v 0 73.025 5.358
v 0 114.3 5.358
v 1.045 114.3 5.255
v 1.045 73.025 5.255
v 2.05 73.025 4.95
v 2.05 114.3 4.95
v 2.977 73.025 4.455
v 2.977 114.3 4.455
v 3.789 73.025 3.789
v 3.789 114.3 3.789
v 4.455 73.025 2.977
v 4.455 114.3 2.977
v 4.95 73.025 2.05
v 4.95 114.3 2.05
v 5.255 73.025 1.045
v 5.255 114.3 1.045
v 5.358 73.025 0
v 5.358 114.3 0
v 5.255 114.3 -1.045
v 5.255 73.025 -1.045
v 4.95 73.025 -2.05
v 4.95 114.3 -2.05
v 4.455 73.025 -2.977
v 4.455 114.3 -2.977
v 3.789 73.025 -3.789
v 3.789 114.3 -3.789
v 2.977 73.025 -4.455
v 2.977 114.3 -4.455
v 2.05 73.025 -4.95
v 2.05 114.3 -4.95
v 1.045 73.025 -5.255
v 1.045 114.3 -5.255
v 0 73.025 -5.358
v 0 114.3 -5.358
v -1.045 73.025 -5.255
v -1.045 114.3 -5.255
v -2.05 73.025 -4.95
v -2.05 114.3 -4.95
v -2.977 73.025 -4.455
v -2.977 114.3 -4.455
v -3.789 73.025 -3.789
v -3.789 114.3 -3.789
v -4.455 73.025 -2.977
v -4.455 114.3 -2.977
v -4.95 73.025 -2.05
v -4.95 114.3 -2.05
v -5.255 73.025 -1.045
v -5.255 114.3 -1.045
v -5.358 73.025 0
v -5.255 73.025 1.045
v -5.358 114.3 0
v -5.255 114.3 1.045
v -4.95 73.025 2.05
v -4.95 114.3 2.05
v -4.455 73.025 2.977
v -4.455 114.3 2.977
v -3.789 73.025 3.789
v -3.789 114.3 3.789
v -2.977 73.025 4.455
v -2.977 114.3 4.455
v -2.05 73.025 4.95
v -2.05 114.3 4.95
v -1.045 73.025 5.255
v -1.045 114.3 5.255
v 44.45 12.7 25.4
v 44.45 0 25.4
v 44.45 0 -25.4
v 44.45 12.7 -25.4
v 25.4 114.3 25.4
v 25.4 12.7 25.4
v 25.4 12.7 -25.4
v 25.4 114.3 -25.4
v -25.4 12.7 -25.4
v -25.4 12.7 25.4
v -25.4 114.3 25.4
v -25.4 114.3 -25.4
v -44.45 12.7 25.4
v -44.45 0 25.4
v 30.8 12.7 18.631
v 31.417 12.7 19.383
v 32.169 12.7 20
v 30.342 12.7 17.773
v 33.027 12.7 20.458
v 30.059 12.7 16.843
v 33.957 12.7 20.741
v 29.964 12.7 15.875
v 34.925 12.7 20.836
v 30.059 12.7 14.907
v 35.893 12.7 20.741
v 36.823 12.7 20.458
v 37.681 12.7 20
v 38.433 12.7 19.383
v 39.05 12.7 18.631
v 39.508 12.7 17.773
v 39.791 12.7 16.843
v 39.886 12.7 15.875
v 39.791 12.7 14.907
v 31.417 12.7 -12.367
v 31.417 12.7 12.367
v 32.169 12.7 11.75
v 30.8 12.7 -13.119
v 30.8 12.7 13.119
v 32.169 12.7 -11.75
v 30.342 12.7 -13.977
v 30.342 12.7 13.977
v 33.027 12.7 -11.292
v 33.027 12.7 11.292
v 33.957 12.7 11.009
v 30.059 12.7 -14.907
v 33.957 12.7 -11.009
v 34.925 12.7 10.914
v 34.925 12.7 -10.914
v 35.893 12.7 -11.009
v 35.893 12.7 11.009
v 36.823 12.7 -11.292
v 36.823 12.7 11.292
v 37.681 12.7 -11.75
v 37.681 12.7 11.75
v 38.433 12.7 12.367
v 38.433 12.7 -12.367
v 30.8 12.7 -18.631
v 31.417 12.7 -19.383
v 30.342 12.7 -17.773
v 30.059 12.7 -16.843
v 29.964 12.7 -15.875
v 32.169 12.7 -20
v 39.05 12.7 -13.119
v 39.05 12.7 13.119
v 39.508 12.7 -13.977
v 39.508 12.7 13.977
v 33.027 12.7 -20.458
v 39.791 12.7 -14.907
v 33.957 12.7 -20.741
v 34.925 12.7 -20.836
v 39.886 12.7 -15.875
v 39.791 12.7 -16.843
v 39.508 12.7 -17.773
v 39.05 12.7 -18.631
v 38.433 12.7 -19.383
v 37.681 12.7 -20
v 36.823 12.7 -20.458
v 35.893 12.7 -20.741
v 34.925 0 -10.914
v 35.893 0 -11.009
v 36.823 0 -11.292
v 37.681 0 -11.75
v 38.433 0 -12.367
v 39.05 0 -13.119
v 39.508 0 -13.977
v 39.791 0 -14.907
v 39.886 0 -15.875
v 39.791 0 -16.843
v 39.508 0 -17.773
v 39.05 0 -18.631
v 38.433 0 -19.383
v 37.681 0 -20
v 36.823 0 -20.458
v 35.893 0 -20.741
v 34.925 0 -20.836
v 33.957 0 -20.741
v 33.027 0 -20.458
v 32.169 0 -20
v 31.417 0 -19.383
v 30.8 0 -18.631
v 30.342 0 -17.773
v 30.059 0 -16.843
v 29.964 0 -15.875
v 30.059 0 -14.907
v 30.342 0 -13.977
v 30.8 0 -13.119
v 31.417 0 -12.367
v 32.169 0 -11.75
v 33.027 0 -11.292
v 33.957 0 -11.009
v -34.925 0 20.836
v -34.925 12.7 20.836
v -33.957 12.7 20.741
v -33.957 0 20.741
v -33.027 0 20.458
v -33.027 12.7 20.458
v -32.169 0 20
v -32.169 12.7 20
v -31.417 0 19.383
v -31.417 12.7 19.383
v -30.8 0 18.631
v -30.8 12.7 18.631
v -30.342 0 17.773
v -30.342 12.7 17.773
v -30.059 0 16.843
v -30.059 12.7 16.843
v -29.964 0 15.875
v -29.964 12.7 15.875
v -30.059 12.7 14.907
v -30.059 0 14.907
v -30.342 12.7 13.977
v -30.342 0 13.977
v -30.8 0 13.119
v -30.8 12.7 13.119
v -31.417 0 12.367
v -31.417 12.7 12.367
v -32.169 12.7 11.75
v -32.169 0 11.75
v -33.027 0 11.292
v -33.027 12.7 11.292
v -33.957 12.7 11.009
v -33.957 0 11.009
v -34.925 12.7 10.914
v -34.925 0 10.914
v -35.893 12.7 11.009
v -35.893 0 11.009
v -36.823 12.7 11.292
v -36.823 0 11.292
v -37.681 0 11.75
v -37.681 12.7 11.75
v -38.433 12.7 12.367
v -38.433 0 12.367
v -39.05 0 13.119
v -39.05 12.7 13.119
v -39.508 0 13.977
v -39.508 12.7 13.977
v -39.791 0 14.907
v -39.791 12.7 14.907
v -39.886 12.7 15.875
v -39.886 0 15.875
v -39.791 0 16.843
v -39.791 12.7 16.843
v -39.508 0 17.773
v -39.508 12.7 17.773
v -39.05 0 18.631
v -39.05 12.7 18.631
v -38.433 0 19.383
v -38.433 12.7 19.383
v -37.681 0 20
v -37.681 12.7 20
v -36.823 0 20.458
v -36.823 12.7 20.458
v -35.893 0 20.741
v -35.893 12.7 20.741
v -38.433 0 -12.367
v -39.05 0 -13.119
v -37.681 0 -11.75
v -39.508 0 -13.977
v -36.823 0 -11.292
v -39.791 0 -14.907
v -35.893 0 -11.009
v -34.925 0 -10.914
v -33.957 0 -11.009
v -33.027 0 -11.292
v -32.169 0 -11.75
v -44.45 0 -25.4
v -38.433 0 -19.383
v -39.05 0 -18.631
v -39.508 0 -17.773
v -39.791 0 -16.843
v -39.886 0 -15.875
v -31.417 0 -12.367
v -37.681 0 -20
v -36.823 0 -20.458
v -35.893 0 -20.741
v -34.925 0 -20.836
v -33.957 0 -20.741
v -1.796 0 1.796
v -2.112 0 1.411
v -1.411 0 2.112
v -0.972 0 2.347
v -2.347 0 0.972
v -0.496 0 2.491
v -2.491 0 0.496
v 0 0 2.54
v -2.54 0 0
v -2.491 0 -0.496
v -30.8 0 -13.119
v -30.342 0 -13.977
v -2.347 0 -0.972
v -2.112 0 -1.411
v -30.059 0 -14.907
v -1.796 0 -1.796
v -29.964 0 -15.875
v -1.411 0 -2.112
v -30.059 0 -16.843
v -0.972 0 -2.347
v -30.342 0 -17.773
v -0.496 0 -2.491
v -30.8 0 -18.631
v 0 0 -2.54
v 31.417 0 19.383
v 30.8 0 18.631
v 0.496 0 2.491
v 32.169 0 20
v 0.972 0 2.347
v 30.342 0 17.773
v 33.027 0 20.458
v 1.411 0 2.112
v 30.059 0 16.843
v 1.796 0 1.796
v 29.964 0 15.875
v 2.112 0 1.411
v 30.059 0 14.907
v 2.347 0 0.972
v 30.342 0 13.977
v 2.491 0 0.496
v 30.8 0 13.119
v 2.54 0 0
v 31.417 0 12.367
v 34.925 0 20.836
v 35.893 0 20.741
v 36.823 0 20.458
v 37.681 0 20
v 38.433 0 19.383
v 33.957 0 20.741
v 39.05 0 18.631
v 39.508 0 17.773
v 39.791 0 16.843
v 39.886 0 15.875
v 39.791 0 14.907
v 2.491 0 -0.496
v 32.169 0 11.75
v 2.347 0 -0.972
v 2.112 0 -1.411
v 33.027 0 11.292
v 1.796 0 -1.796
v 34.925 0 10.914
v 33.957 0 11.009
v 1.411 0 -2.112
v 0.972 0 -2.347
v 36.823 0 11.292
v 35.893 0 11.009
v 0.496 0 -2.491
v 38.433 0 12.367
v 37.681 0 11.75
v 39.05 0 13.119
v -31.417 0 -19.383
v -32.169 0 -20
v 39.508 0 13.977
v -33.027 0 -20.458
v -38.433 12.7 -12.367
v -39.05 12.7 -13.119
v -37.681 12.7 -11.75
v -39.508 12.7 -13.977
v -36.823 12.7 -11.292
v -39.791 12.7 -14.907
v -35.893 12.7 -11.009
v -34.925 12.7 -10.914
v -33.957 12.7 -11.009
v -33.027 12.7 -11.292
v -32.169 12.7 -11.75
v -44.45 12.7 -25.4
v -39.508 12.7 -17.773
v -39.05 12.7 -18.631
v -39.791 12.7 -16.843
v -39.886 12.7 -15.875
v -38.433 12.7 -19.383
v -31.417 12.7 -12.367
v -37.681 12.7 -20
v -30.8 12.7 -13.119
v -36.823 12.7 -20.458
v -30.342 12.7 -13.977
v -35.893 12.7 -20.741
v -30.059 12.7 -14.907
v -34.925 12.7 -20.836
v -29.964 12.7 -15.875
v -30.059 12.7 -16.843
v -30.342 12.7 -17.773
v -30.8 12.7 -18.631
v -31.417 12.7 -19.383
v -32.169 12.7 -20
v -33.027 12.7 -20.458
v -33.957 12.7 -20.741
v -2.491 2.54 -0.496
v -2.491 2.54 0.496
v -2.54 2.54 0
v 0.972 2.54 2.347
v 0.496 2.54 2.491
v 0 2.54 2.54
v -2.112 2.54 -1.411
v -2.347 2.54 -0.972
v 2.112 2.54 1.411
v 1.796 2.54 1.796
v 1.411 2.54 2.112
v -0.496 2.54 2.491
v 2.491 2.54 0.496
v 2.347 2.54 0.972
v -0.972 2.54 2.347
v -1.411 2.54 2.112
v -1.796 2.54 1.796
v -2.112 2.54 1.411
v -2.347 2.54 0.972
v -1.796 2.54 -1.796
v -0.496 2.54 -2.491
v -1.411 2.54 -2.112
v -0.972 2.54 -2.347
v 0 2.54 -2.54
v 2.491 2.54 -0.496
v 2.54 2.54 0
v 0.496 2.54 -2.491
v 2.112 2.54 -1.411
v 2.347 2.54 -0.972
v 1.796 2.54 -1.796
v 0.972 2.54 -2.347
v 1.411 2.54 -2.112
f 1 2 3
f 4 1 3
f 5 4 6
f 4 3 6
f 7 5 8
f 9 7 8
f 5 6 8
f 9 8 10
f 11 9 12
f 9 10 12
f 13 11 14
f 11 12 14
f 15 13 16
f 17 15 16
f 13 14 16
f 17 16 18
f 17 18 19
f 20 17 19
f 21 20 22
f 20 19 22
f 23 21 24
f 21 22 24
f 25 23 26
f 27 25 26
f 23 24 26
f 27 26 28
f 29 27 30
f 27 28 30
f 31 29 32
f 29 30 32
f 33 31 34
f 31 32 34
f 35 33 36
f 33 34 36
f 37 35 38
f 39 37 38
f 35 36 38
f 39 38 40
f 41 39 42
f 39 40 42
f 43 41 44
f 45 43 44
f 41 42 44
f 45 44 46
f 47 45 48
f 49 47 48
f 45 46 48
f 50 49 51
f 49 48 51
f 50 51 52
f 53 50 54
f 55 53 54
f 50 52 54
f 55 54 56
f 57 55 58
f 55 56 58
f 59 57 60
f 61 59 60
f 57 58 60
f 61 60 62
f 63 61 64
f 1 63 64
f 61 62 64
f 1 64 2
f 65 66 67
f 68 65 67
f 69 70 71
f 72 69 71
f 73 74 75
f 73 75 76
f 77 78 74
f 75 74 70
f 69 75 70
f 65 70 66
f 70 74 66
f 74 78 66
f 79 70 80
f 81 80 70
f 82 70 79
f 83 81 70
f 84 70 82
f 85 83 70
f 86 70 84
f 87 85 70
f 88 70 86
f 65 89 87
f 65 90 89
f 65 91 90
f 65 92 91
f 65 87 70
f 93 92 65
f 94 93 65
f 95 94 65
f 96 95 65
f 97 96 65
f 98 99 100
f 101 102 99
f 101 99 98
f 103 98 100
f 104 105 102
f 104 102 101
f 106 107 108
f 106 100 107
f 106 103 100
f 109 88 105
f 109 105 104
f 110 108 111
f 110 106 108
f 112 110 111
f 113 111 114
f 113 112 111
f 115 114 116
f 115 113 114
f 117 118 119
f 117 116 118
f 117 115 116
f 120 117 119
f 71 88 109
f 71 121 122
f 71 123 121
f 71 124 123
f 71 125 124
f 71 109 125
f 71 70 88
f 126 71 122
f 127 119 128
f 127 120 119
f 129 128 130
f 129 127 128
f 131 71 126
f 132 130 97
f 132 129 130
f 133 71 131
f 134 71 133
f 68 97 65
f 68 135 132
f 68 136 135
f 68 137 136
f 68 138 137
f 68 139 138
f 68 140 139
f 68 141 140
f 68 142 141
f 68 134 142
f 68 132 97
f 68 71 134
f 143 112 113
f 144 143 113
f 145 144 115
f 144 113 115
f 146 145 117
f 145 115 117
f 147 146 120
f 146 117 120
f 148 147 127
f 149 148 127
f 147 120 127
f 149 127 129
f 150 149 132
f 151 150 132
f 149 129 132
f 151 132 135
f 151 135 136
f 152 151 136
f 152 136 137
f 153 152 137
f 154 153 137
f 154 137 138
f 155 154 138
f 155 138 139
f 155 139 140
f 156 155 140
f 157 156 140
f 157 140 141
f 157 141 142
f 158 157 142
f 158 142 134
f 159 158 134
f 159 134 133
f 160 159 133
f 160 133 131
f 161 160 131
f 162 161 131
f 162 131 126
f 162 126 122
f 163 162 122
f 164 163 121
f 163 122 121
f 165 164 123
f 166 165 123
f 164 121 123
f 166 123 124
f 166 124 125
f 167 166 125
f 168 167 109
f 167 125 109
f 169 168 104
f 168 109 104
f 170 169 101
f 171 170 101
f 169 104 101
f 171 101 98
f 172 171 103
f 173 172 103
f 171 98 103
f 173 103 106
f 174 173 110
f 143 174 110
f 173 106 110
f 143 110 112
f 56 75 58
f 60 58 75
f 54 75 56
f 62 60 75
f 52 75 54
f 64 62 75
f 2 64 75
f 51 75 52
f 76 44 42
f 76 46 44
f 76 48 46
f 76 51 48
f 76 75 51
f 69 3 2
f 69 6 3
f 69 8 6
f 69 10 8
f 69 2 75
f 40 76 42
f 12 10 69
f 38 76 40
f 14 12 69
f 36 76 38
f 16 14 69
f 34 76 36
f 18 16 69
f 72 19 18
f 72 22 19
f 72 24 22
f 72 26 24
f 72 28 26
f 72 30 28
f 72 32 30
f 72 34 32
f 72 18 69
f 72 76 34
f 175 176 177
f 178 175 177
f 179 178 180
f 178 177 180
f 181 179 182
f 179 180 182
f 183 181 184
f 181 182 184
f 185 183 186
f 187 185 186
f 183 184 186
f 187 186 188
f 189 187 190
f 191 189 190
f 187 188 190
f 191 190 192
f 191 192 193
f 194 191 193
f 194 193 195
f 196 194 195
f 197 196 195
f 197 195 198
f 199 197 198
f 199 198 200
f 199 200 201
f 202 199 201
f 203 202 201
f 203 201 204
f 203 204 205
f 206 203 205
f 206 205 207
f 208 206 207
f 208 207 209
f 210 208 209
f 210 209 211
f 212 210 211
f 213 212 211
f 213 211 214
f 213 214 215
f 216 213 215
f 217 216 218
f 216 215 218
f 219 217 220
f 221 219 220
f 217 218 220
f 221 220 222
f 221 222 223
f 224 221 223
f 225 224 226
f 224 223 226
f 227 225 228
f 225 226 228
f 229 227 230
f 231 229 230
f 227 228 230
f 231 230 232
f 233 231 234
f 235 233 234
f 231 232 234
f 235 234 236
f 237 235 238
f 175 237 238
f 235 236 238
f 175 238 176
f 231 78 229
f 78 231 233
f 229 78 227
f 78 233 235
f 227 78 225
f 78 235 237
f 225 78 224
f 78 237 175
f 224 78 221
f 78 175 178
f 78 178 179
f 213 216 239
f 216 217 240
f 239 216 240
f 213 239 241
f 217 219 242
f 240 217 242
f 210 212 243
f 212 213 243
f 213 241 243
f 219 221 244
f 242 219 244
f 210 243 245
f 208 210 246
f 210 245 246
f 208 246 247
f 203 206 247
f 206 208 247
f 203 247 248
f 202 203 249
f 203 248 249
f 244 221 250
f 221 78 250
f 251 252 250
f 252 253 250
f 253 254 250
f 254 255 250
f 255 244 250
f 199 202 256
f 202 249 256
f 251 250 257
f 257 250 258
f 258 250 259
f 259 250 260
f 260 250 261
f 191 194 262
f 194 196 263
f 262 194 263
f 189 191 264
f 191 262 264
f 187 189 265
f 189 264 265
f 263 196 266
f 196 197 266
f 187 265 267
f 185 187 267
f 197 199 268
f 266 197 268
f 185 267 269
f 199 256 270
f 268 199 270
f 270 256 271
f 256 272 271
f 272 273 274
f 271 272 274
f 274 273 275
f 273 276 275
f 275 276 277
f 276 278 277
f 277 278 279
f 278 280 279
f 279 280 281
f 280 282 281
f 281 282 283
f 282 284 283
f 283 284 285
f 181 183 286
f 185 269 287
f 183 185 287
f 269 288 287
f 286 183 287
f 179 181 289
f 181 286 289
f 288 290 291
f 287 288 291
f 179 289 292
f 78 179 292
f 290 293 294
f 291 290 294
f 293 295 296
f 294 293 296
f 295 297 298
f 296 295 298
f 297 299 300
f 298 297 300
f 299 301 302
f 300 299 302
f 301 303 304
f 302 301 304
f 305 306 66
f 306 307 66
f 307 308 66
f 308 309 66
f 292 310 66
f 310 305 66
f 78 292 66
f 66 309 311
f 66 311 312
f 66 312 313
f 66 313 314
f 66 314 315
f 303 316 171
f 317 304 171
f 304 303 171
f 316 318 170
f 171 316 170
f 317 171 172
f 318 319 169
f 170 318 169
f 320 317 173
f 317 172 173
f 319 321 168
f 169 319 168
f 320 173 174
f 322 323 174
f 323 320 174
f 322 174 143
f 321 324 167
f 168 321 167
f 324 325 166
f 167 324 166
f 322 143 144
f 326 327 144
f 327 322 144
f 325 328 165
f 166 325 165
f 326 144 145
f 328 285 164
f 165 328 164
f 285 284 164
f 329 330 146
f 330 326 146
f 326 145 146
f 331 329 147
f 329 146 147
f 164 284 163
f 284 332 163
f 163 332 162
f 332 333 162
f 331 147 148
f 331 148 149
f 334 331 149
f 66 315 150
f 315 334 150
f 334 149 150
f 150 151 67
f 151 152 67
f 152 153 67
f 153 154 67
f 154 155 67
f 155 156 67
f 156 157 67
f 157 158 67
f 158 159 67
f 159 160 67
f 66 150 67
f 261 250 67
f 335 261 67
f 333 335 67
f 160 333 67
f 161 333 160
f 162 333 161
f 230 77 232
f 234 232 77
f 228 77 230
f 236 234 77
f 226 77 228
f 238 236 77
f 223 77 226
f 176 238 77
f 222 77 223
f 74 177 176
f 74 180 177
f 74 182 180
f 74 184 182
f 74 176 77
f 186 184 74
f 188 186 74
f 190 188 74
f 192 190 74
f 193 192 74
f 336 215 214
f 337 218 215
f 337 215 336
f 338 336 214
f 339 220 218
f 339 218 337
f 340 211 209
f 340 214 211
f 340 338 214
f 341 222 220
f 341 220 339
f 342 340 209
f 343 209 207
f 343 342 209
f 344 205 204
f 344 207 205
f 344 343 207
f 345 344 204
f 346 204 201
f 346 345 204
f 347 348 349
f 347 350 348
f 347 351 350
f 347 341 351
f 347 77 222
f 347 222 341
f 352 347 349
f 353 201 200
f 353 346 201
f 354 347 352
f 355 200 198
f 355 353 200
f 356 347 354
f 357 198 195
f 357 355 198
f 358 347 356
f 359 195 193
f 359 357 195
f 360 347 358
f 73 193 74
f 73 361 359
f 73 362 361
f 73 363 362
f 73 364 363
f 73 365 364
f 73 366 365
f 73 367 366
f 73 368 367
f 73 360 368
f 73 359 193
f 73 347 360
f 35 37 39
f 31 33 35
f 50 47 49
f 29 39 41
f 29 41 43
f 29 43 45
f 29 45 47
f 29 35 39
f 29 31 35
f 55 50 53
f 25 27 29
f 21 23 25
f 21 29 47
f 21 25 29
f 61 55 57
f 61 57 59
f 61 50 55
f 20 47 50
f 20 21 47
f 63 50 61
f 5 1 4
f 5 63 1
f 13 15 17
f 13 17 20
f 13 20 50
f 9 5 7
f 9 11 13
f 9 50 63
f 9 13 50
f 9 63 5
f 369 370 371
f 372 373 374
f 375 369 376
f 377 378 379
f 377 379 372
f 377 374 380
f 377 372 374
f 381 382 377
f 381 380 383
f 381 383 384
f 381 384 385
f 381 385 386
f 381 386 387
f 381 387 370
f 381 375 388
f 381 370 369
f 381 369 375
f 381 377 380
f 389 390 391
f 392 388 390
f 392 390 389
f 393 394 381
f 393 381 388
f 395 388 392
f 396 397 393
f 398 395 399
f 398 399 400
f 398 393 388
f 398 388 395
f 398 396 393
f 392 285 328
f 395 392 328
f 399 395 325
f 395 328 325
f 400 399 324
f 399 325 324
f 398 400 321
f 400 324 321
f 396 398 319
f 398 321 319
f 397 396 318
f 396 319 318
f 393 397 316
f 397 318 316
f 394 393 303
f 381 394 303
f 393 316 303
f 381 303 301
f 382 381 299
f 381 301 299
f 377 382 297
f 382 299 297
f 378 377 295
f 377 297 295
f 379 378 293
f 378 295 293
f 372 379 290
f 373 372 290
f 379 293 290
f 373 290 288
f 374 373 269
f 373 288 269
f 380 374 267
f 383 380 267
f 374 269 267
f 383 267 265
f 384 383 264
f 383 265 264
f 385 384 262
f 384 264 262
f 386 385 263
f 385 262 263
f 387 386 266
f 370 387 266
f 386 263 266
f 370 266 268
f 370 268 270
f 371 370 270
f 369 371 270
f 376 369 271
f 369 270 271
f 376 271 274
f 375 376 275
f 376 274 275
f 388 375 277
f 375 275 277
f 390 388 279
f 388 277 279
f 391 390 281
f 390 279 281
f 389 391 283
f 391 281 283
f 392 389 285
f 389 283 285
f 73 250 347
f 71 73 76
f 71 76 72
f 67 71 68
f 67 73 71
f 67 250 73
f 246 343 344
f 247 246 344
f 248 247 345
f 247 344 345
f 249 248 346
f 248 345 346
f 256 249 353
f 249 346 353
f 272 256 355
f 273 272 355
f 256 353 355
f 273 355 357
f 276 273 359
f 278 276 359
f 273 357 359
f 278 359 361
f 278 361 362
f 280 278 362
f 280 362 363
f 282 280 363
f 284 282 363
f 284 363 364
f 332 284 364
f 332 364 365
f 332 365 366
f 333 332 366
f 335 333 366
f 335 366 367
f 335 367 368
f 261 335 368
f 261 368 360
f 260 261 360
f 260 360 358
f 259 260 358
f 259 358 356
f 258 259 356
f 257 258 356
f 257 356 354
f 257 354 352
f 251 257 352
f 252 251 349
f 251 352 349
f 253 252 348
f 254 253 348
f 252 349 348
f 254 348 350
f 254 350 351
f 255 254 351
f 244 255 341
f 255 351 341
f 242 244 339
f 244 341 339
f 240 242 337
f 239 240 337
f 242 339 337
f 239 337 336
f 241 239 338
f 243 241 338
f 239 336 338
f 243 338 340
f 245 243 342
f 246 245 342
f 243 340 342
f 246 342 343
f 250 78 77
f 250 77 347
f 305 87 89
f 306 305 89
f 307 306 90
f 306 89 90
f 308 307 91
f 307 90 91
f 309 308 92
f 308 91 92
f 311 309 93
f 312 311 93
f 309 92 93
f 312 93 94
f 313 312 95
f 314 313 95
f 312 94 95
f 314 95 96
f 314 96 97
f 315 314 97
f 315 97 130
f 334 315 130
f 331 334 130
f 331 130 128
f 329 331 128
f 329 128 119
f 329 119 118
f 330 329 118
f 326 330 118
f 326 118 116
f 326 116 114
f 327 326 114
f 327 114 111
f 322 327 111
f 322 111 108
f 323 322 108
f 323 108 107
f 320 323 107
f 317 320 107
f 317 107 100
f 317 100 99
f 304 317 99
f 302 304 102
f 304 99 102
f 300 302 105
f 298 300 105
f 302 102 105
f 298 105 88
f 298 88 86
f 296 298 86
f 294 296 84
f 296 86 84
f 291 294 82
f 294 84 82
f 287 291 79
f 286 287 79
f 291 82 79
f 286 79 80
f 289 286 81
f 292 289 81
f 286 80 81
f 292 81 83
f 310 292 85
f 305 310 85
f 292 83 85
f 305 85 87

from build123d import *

# Parameters (mm, degrees)
SKETCH1_W           = 88.9
SKETCH1_H           = 50.8
BOSS_EXTRUDE1_DEPTH = 114.3
SKETCH2_OUTSIDE_W   = 121.59
SKETCH2_OUTSIDE_H   = 83.49
SKETCH2_OUTSIDE_W_2 = 50.8
SKETCH2_OUTSIDE_H_2 = 50.8
CUT_EXTRUDE1_DEPTH  = 101.6
SKETCH3_R           = 4.9609375
CUT_EXTRUDE2_DEPTH  = 114.769602707
SKETCH4_R           = 5.3578125
CUT_EXTRUDE3_DEPTH  = 41.275
SKETCH5_R           = 2.54
CUT_EXTRUDE4_DEPTH  = 2.54


with BuildPart() as part:
    # Sketch1 → Boss-Extrude1 (new body)
    with BuildSketch(Plane(origin=(0, 0, 0), x_dir=(1, 0, 0), z_dir=(0, 1, 0))):
        Rectangle(SKETCH1_W, SKETCH1_H)
    extrude(amount=BOSS_EXTRUDE1_DEPTH)

    # Sketch2 outside → Cut-Extrude1 (cut)
    with BuildSketch(Plane(origin=(0, 114.3, 0), x_dir=(1, 0, 0), z_dir=(0, 1, 0))):
        Rectangle(SKETCH2_OUTSIDE_W, SKETCH2_OUTSIDE_H)
        Rectangle(SKETCH2_OUTSIDE_W_2, SKETCH2_OUTSIDE_H_2, mode=Mode.SUBTRACT)
    extrude(amount=-CUT_EXTRUDE1_DEPTH, mode=Mode.SUBTRACT)

    # Sketch3 → Cut-Extrude2 (cut, through all)
    with BuildSketch(Plane(origin=(0, 12.7, 0), x_dir=(1, 0, 0), z_dir=(0, 1, 0))):
        with Locations(Location((-34.925, 15.875, 0), (0, 0, 270))):
            Circle(SKETCH3_R)
        with Locations(Location((-34.925, -15.875, 0), (0, 0, 270))):
            Circle(SKETCH3_R)
        with Locations(Location((34.925, -15.875, 0), (0, 0, 270))):
            Circle(SKETCH3_R)
        with Locations(Location((34.925, 15.875, 0), (0, 0, 270))):
            Circle(SKETCH3_R)
    extrude(amount=-CUT_EXTRUDE2_DEPTH, mode=Mode.SUBTRACT)

    # Sketch4 → Cut-Extrude3 (cut)
    with BuildSketch(Plane(origin=(0, 114.3, 0), x_dir=(1, 0, 0), z_dir=(0, 1, 0))):
        with Locations(Location((0, 0, 0), (0, 0, 270))):
            Circle(SKETCH4_R)
    extrude(amount=-CUT_EXTRUDE3_DEPTH, mode=Mode.SUBTRACT)

    # Sketch5 → Cut-Extrude4 (cut)
    with BuildSketch(Plane.XZ):
        with Locations(Location((0, 0, 0), (0, 0, 270))):
            Circle(SKETCH5_R)
    extrude(amount=-CUT_EXTRUDE4_DEPTH, mode=Mode.SUBTRACT)


solid = part.part
